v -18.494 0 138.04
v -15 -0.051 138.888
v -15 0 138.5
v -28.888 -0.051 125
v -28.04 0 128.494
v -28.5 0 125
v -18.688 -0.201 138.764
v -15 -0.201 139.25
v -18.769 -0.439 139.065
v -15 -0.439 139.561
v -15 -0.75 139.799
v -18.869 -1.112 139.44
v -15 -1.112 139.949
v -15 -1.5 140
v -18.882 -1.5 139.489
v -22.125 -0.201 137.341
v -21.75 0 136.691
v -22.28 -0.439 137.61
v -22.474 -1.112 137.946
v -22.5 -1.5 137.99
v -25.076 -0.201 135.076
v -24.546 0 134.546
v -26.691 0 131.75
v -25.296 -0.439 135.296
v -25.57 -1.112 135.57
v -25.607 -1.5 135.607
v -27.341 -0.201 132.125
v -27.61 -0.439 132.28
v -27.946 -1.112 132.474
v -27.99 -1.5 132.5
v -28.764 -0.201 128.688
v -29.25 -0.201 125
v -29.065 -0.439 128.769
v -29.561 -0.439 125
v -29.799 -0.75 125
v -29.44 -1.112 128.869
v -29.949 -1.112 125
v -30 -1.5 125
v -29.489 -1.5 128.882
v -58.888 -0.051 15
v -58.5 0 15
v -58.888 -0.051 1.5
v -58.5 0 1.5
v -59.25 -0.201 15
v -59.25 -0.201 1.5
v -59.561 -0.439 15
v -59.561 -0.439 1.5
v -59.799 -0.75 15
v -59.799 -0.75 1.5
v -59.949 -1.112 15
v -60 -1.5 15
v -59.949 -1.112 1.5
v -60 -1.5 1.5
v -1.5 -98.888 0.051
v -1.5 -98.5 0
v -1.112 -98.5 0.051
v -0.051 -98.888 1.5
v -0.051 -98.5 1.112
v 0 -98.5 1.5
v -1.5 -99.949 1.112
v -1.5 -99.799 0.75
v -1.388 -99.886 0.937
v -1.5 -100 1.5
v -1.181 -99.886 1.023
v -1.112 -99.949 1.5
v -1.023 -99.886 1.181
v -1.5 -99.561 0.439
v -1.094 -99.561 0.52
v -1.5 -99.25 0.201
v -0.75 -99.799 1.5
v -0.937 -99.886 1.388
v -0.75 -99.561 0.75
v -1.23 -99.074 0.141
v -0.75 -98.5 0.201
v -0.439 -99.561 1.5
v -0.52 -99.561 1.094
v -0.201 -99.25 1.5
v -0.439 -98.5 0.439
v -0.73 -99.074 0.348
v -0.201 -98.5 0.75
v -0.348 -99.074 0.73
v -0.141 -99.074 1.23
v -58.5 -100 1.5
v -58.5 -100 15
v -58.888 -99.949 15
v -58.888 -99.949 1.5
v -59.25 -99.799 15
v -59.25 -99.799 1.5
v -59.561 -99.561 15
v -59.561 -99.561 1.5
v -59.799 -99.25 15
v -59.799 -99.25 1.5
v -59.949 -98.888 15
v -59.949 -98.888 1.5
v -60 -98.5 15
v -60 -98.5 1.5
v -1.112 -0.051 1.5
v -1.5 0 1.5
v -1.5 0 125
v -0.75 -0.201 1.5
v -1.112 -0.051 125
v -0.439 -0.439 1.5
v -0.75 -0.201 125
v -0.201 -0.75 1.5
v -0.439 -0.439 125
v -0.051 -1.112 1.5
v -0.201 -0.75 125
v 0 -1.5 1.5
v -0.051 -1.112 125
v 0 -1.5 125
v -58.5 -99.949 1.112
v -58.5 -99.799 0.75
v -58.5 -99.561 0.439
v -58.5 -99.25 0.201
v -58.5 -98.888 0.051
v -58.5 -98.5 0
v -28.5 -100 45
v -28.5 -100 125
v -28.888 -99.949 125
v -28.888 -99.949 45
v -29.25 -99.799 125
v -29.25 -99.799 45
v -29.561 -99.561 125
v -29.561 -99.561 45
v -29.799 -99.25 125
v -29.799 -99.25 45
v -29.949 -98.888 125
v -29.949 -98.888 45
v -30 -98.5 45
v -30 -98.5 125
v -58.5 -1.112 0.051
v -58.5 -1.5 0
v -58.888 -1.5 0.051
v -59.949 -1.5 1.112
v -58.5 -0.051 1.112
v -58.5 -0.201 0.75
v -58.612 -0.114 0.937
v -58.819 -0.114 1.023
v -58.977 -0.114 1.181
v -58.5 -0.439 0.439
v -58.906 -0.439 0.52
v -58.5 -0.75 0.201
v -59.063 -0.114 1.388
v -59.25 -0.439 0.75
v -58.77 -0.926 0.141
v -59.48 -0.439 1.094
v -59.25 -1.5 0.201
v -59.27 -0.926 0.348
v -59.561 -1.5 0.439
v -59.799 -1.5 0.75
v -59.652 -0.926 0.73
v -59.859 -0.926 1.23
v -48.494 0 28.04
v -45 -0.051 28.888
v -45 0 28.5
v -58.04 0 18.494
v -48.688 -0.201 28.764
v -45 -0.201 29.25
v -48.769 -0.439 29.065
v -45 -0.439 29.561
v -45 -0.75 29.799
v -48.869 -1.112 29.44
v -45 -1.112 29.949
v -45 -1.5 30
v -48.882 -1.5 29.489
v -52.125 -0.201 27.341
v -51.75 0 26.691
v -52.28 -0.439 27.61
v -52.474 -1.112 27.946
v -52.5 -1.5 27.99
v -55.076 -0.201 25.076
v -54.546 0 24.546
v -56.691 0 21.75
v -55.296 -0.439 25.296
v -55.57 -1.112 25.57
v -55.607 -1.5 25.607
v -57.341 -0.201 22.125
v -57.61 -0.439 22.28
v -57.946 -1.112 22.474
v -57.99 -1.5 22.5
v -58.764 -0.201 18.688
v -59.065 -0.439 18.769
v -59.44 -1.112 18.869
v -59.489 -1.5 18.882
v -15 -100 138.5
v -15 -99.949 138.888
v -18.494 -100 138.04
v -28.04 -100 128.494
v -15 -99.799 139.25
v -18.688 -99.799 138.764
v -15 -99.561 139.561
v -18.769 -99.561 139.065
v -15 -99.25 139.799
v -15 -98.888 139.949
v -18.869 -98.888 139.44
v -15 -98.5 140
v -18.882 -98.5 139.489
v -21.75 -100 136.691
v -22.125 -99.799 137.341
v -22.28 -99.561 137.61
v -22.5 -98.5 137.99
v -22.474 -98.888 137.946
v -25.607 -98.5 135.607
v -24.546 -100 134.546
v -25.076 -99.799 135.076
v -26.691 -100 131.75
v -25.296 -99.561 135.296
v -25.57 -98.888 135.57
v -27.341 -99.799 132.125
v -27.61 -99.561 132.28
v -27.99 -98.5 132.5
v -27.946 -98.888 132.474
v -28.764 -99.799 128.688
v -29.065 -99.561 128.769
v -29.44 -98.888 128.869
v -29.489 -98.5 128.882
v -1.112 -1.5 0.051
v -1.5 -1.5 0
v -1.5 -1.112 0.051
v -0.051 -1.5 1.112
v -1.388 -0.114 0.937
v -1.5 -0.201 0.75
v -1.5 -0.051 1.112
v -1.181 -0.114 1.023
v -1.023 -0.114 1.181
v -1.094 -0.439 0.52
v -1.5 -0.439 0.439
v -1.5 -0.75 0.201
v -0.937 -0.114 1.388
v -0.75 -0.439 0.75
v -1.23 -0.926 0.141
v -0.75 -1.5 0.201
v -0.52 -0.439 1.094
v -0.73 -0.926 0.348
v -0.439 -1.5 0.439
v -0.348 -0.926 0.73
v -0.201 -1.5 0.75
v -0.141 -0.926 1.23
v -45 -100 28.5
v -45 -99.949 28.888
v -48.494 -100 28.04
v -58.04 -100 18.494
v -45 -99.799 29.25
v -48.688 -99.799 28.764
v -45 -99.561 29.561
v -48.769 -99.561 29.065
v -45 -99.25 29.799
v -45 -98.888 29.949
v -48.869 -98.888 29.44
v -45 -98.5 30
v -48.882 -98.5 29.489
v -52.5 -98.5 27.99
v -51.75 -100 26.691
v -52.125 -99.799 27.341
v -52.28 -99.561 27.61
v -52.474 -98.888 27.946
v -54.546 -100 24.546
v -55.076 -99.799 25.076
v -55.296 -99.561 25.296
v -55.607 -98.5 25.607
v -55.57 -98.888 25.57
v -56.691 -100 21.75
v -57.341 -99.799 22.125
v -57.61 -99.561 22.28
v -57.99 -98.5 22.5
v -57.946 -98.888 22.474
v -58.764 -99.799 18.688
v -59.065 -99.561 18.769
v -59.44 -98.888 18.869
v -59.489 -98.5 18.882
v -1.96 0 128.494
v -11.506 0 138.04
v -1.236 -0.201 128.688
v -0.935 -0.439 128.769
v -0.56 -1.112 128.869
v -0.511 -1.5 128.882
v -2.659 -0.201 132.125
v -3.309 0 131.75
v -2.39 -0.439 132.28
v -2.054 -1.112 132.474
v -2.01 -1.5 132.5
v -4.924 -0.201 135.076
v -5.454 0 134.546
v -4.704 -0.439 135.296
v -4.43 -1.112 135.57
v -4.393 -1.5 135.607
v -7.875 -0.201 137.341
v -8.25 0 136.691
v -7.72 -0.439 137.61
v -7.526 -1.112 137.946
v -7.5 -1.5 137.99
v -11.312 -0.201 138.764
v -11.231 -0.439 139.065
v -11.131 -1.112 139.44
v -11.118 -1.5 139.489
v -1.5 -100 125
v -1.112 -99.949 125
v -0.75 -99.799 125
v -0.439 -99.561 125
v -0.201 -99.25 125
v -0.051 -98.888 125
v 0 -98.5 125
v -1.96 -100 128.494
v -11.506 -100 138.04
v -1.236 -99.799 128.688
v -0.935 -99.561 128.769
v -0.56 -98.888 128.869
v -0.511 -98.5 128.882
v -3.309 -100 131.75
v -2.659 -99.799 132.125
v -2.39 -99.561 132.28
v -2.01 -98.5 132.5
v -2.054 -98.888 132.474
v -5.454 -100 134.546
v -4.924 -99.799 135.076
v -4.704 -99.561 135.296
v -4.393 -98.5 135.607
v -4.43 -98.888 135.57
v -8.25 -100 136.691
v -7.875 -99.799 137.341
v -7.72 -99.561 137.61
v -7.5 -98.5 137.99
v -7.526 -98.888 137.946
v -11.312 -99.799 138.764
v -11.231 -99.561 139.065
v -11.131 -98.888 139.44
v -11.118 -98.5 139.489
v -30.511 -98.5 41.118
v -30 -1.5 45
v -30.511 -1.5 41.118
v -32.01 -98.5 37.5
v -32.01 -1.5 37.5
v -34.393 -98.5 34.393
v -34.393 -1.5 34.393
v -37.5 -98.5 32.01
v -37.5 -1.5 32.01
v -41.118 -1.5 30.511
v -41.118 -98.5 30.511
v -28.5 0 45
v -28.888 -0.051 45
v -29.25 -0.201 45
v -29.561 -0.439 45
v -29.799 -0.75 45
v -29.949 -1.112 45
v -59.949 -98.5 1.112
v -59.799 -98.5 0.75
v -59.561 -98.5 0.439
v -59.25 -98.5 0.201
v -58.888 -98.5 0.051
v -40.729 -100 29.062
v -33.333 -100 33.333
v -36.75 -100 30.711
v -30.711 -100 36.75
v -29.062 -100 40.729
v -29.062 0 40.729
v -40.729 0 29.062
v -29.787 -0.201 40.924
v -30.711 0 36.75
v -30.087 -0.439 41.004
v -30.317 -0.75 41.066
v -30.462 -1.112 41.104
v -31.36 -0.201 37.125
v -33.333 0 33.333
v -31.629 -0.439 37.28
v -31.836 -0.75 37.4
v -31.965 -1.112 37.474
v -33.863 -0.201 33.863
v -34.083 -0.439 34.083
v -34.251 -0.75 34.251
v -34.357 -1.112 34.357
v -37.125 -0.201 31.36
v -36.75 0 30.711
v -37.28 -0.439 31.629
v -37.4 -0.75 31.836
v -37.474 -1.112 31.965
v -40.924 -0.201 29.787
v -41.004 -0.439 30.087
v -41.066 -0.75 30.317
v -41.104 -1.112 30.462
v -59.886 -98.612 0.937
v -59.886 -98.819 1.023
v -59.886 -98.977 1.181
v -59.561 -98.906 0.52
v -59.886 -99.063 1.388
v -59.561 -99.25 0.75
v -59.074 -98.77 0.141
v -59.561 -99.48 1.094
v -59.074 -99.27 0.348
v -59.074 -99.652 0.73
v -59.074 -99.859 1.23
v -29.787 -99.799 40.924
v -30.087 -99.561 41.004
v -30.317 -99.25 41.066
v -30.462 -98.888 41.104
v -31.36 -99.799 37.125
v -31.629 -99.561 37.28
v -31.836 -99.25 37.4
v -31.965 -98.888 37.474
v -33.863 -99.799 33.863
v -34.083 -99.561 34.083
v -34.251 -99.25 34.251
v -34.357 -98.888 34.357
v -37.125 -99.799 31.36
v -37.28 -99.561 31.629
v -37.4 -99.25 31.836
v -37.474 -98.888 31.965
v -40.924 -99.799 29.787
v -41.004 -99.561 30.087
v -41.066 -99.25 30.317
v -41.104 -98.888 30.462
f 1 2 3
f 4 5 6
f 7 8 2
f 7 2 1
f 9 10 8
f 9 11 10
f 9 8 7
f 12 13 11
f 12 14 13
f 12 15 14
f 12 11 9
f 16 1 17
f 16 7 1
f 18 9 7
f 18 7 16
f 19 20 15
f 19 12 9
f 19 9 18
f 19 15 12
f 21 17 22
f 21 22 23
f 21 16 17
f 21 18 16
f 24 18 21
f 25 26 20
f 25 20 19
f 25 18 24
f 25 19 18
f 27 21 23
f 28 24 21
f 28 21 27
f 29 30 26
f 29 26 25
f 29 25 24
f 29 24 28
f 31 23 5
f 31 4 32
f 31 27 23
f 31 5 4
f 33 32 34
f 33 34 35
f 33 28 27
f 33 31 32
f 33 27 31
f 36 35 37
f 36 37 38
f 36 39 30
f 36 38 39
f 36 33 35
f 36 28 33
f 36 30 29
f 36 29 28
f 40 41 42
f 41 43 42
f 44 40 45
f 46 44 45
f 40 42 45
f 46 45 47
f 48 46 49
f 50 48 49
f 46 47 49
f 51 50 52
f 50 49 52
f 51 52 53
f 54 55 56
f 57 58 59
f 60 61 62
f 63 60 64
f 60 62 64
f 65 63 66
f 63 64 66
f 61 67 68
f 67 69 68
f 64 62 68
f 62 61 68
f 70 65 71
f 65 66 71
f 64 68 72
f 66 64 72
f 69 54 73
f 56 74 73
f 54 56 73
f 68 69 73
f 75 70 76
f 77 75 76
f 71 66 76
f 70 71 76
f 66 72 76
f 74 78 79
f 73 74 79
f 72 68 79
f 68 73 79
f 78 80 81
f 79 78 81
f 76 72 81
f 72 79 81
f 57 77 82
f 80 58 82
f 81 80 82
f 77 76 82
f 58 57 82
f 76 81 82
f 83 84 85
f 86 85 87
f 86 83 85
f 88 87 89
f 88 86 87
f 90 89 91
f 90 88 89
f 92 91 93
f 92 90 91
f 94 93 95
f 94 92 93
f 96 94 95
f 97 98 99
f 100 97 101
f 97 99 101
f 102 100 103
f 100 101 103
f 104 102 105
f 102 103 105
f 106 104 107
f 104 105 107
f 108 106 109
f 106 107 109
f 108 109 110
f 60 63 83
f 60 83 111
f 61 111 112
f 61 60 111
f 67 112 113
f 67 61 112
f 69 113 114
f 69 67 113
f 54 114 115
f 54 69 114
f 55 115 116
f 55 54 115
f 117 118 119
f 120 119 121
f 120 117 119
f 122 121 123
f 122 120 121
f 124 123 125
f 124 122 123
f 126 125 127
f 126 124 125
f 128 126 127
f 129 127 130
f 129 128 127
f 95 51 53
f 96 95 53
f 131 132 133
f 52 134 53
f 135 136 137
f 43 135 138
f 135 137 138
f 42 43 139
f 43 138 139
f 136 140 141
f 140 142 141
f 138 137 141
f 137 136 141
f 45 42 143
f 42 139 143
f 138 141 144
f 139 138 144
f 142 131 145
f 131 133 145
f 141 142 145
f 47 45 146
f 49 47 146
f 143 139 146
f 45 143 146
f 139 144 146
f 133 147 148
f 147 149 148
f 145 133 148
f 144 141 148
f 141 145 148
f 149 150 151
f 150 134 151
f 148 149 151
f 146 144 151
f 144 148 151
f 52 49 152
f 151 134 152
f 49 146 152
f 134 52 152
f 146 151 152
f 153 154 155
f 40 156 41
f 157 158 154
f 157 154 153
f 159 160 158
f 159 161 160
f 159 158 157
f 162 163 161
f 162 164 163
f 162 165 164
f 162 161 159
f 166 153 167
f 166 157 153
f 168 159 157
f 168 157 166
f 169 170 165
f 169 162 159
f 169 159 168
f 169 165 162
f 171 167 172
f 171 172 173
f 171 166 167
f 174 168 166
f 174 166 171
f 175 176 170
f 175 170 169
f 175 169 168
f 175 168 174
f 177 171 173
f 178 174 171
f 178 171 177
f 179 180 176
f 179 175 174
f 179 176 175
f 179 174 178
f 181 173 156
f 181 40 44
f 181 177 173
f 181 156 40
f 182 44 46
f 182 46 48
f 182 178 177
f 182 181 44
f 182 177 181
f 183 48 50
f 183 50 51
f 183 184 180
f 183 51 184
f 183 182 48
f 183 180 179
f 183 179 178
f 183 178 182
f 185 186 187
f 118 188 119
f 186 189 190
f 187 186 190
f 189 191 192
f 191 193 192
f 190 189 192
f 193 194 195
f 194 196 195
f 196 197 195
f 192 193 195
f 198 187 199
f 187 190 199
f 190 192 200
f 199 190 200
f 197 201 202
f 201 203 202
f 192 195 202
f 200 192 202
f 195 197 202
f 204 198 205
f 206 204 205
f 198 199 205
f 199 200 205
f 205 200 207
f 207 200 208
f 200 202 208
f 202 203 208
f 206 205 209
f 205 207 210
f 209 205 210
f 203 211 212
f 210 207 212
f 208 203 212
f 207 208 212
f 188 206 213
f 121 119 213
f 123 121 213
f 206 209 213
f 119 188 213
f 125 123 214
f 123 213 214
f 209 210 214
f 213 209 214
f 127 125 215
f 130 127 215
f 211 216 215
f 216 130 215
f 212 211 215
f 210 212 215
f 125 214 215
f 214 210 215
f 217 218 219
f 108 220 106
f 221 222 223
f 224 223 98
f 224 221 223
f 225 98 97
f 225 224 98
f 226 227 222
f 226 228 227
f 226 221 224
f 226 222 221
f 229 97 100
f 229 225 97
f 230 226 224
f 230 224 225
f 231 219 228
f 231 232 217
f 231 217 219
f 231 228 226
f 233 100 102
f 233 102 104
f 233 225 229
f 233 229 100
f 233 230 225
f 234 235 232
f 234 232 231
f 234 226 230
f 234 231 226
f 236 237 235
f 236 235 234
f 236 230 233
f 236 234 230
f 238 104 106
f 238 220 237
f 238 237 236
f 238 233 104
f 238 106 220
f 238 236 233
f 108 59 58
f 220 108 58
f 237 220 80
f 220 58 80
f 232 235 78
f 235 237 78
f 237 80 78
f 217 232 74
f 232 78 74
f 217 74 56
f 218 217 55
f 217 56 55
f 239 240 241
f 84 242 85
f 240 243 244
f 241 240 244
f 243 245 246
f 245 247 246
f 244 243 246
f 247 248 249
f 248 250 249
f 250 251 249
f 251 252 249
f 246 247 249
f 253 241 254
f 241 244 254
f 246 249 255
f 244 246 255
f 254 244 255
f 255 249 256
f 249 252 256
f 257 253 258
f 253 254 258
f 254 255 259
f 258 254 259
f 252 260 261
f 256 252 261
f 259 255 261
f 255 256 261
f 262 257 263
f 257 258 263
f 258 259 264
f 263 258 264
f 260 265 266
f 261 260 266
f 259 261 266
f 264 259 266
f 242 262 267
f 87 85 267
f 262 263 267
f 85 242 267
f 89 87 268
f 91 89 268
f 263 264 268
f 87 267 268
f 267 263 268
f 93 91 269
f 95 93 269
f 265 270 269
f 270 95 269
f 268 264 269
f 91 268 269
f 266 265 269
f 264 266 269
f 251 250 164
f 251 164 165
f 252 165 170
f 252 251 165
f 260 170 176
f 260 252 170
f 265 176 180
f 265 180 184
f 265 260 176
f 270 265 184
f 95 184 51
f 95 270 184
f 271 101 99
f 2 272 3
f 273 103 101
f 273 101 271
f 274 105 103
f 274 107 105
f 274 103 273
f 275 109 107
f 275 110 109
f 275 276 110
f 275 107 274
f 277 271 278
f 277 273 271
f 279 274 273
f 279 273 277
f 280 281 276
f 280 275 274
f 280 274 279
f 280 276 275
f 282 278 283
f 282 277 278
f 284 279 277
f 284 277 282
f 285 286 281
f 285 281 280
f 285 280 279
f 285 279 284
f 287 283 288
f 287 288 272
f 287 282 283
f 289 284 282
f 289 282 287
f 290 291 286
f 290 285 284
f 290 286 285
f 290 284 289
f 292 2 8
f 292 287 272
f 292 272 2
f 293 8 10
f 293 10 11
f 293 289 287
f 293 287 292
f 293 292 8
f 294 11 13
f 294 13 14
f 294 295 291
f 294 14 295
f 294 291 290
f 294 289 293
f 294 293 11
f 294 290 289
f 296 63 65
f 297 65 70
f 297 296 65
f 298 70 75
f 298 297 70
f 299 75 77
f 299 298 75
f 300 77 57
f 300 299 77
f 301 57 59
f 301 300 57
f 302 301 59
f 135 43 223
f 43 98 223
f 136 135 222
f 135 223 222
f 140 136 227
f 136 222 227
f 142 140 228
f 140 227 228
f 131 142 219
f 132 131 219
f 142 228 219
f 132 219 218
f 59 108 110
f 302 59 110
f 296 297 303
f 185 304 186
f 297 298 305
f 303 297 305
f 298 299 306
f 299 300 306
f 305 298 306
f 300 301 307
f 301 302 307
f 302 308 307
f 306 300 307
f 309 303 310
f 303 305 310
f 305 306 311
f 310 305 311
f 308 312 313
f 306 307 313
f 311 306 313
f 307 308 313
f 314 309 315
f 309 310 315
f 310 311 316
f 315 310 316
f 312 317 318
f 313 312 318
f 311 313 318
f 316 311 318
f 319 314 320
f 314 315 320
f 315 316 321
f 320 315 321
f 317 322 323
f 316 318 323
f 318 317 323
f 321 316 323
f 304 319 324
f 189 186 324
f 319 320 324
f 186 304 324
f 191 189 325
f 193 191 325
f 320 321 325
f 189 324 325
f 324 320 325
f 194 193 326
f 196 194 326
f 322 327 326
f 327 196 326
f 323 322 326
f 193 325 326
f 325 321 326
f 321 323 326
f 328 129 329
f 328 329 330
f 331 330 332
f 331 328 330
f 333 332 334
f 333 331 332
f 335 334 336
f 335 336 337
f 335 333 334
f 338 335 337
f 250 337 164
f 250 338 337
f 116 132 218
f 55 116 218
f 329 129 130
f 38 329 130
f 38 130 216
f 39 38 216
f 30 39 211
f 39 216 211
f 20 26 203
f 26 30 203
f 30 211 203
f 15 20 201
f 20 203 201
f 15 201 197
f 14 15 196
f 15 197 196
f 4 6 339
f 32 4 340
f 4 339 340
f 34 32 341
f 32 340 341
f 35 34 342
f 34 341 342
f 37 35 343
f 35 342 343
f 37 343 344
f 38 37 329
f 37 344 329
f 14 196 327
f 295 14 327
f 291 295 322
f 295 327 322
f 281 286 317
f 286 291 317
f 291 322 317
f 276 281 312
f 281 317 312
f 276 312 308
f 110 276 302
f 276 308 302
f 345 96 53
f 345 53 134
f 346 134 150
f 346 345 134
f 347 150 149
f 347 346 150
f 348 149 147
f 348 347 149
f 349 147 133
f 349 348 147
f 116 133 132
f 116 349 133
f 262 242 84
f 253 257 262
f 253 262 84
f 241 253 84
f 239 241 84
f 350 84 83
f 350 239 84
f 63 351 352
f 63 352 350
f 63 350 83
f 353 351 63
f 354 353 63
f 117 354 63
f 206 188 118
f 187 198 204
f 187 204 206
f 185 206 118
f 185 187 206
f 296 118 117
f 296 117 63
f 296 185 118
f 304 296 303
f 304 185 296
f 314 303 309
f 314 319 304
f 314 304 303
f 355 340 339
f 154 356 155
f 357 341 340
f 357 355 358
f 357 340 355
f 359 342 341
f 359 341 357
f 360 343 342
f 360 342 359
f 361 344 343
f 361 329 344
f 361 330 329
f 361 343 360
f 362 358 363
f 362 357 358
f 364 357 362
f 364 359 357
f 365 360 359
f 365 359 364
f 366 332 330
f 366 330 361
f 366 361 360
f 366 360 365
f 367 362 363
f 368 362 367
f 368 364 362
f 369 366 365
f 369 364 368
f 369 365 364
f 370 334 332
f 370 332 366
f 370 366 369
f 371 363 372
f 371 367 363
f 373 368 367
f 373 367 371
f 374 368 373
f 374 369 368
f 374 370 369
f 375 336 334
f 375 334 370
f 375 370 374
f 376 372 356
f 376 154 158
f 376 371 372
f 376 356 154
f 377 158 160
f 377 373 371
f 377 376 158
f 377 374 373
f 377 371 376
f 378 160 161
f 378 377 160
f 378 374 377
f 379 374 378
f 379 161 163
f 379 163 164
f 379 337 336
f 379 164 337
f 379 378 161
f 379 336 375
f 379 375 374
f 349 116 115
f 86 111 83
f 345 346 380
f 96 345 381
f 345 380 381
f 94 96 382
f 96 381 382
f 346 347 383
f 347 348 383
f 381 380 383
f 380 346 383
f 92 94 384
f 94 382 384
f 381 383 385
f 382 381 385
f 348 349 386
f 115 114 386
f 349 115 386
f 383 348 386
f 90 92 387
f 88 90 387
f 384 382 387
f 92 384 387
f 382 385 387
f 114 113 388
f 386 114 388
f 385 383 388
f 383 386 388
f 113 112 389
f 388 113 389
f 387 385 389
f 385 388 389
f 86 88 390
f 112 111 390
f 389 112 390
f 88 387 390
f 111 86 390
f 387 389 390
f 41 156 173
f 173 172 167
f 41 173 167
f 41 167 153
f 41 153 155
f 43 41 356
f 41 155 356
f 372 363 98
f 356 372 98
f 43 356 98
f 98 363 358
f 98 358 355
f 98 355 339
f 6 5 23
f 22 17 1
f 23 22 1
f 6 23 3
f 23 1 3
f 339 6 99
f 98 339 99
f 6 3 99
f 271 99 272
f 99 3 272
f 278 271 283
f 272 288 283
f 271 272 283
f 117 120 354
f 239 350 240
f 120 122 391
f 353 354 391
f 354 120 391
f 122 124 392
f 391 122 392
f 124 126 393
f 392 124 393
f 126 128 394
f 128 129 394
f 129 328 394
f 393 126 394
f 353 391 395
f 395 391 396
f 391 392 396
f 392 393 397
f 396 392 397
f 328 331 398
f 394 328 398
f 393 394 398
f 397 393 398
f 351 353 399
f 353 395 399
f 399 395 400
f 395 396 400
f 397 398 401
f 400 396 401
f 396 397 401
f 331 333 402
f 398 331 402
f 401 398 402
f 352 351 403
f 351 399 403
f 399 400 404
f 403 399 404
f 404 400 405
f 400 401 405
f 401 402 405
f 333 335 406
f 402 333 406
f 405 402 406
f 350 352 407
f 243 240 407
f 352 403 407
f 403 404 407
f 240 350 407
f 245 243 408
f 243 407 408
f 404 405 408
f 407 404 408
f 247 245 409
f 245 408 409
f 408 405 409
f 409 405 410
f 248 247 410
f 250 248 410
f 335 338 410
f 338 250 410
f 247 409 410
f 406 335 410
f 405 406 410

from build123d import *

# Parameters (mm, degrees)
F0_W     = 30
F0_H     = 110
F1_DEPTH = 100
F2_R     = 14.99999
F3_R     = 14.99999
F4_R     = 1.5


# Not quite as in the source:
# - a fillet or chamfer is up to 0.001 mm smaller than in the source, because OpenCascade refuses the exact size


with BuildPart() as f1:
    # F0 (on Front) → F1 (new body)
    with BuildSketch(Plane.XZ):
        Polygon((-60, 0), (0, 0), (0, 30), (-30, 30), (-60, 30), align=None)
        with Locations((-15, 85)):
            Rectangle(F0_W, F0_H)
    extrude(amount=F1_DEPTH)

    # F2 (radius 15 in the source; OpenCascade refuses exactly that, so slightly less here)
    f2_edges = [f1.edges().sort_by_distance(p)[0] for p in [
        (-30, -50, 30),
        (-60, -50, 30),
    ]]
    fillet(f2_edges, radius=F2_R)

    # F3 (radius 15 in the source; OpenCascade refuses exactly that, so slightly less here)
    f3_edges = [f1.edges().sort_by_distance(p)[0] for p in [
        (-30, -50, 140),
        (0, -50, 140),
    ]]
    fillet(f3_edges, radius=F3_R)

    # F4
    f4_edges = [f1.edges().sort_by_distance(p)[0] for p in [
        (0, -50, 0),
        (-30, -100, 0),
        (-60, -50, 0),
        (-30, 0, 0),
        (0, -100, 62.500005),
        (0, 0, 62.500005),
    ]]
    fillet(f4_edges, radius=F4_R)


solid = f1.part
